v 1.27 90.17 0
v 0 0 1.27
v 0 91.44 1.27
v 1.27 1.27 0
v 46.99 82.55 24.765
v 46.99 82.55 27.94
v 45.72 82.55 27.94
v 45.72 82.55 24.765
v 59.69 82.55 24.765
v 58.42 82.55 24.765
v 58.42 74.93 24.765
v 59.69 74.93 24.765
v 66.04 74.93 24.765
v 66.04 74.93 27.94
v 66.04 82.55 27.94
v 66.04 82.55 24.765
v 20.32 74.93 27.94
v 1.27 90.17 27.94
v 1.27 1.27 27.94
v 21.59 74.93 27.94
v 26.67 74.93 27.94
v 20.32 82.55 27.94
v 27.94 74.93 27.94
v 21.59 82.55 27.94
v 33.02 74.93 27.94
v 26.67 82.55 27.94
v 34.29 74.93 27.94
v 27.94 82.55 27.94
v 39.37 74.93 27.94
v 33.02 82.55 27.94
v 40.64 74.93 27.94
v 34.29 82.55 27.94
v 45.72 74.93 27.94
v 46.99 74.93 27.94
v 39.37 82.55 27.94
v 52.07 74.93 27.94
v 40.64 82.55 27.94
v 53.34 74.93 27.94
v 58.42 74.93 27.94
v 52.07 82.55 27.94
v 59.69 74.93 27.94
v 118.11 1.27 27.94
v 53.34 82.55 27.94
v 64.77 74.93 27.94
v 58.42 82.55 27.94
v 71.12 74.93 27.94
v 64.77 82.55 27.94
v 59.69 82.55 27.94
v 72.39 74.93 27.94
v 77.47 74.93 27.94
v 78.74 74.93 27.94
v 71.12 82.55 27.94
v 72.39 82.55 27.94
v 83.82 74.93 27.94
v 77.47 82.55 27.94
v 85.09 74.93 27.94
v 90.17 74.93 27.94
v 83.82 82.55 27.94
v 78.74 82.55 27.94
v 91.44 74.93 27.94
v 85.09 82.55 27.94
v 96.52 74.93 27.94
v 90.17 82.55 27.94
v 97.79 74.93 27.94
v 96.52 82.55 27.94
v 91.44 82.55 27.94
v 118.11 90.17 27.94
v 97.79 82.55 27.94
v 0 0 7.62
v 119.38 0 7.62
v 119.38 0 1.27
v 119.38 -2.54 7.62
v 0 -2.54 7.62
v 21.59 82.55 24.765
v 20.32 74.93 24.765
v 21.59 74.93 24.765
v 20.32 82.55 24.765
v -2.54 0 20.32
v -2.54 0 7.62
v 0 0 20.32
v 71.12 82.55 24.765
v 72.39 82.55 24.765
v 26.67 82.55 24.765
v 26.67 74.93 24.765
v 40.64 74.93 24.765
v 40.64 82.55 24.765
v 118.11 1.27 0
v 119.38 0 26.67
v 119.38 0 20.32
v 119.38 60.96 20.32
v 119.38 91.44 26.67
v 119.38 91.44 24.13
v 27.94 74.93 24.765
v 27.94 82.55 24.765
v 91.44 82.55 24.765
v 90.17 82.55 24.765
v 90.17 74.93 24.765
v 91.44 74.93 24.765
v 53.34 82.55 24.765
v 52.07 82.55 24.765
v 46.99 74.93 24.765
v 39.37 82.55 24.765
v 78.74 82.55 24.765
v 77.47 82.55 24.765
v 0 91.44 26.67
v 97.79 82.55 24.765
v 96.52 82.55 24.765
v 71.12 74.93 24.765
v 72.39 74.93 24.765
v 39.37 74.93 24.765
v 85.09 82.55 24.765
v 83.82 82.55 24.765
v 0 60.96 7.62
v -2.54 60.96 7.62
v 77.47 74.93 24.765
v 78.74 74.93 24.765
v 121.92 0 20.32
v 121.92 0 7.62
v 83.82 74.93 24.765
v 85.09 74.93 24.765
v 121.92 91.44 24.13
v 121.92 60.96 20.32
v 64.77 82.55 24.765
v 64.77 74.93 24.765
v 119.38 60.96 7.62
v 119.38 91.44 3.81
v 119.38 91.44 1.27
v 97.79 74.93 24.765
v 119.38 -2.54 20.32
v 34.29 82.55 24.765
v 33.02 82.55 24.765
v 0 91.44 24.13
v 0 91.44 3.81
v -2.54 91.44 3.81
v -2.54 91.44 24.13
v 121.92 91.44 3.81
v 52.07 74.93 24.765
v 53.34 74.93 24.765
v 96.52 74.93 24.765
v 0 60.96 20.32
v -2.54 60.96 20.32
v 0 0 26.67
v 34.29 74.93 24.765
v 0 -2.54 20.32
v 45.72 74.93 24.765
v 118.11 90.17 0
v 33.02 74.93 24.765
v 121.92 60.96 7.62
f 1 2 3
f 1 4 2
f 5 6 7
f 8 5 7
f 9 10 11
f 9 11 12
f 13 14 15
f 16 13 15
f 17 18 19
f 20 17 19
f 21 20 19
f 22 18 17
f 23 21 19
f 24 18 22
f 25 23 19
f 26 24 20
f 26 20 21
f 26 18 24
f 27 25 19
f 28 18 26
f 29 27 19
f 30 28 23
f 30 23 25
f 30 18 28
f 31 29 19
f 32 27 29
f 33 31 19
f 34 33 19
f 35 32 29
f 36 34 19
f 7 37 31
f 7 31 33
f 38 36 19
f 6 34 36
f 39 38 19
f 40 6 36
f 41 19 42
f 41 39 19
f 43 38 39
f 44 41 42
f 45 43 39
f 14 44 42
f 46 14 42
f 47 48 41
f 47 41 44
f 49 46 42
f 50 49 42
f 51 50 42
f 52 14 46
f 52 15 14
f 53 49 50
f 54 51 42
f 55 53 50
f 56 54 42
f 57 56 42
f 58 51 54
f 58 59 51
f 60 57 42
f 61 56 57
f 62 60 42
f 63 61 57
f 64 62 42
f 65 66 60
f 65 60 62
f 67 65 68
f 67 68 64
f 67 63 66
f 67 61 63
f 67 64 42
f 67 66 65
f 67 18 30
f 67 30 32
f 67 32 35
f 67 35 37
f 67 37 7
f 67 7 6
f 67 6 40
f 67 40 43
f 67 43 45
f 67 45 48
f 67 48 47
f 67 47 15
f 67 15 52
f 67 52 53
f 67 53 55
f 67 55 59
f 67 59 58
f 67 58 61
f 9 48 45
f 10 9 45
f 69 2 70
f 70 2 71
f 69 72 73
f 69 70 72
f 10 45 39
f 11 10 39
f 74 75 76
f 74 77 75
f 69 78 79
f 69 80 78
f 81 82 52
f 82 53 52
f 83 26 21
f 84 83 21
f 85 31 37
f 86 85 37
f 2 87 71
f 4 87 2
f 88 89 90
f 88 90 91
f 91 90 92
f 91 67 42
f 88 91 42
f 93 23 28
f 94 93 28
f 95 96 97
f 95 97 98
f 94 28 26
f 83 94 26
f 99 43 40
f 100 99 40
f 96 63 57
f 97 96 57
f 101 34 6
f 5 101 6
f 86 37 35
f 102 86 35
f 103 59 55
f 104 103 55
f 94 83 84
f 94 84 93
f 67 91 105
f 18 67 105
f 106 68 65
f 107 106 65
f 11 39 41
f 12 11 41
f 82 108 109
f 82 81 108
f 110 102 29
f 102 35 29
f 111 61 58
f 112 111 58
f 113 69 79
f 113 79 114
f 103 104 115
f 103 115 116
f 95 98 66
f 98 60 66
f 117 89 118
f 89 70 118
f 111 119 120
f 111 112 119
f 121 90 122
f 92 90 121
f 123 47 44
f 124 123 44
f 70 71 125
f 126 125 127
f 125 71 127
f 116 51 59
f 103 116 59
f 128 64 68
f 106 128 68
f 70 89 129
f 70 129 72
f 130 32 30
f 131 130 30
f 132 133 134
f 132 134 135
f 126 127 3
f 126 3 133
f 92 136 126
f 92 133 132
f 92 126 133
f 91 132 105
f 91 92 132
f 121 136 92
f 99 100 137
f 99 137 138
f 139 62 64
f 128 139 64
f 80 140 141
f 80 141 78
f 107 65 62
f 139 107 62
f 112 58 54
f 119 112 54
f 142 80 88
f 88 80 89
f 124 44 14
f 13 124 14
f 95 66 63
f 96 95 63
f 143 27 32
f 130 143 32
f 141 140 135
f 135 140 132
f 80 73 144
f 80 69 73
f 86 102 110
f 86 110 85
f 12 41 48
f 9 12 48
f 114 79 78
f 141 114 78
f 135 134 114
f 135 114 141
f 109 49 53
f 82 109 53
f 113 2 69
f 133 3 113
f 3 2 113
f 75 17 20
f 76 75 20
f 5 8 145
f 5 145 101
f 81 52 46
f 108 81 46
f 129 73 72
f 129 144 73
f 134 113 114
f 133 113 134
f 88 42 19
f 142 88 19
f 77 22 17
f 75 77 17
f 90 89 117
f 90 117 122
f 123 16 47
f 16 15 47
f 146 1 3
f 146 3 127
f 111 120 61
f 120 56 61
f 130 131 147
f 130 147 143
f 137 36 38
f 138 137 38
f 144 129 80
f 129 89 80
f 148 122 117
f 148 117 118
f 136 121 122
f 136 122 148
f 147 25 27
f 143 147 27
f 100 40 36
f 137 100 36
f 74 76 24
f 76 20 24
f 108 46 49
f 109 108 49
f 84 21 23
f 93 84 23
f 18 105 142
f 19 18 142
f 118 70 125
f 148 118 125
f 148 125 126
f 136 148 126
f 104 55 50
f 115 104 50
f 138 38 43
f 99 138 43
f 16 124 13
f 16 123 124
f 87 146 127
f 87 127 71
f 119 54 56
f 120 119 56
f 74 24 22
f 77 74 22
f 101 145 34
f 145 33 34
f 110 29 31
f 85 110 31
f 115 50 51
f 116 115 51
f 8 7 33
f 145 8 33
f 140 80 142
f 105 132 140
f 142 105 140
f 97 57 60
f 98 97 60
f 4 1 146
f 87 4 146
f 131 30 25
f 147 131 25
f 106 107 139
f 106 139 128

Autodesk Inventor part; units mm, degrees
ref_plane "YZ Plane" through (0, 0, 0) normal (1, 0, 0) x (0, 1, 0)
ref_plane "XZ Plane" through (0, 0, 0) normal (0, 1, 0) x (-1, 0, 0)
ref_plane "XY Plane" through (0, 0, 0) normal (0, 0, 1) x (1, 0, 0)
sketch "Sketch1" plane through (0, 0, 0) normal (0, 0, 1) x (1, 0, 0)
  line L0 (0, 0) -> (119.38, 0)
  line L1 (119.38, 0) -> (119.38, 91.44)
  line L2 (119.38, 91.44) -> (0, 91.44)
  line L3 (0, 91.44) -> (0, 0)
  dimension "d0" = 119.38
  dimension "d1" = 91.44
extrude "Extrusion1" add sketch "Sketch1" along normal blind 27.94
chamfer "Chamfer1" distance 1.27 angle 45 1 edges at (59.69, 0, 0)
chamfer "Chamfer2" distance 1.27 angle 45 1 edges at (0, 46.355, 0)
chamfer "Chamfer3" distance 1.27 angle 45 1 edges at (60.325, 91.44, 0)
chamfer "Chamfer4" distance 1.27 angle 45 1 edges at (119.38, 45.72, 0)
chamfer "Chamfer5" distance 1.27 angle 45 1 edges at (0, 45.72, 27.94)
chamfer "Chamfer6" distance 1.27 angle 45 1 edges at (60.325, 0, 27.94)
chamfer "Chamfer7" distance 1.27 angle 45 2 edges at (60.325, 91.44, 27.94) (119.38, 46.355, 27.94)
sketch "Sketch2" plane through (119.38, 0, 1.27) normal (1, 0, 0) x (0, 0, -1)
  line L0 (-25.4, 0) -> (-25.4, 91.44) projected
  line L1 (0, 0) -> (-25.4, 0) projected
  line L2 (-19.05, 0) -> (-19.05, 60.96)
  line L3 (-6.35, 0) -> (-6.35, 60.96)
  line L4 (-19.05, 0) -> (-6.35, 0)
  line L5 (-19.05, 60.96) -> (-22.86, 91.44)
  line L6 (0, 91.44) -> (-25.4, 91.44) projected
  line L7 (-6.35, 60.96) -> (-2.54, 91.44)
  line L8 (-22.86, 91.44) -> (-2.54, 91.44)
  dimension "d25" = 60.96
  dimension "d26" = 60.96
  dimension "d27" = 12.7
  dimension "d28" = 6.35
  dimension "d29" = 20.32
  dimension "d30" = 2.54
extrude "Extrusion2" add sketch "Sketch2" along normal blind 2.54 contours L2 L5 L6 L7 L3 L1
sketch "Sketch3" plane through (0, 0, 1.27) normal (0, -1, 0) x (1, 0, 0)
  line L0 (0, 0) -> (0, 25.4) projected
  line L1 (119.38, 19.05) -> (0, 19.05)
  line L2 (119.38, 6.35) -> (0, 6.35)
  line L3 (0, 19.05) -> (0, 6.35)
  line L4 (119.38, 19.05) -> (119.38, 6.35)
extrude "Extrusion3" add sketch "Sketch3" along normal blind 2.54
sketch "Sketch4" plane through (0, 0, 1.27) normal (-1, 0, 0) x (0, 0, 1)
  line L0 (25.4, 91.44) -> (25.4, 0) projected
  line L1 (0, 91.44) -> (25.4, 91.44) projected
  line L2 (0, 0) -> (0, 91.44) projected
  line L3 (0, 0) -> (6.35, 0) projected
  line L4 (6.35, 0) -> (6.35, -2.54) projected
  line L5 (19.05, -2.54) -> (6.35, -2.54) projected
  line L6 (19.05, 0) -> (19.05, -2.54) projected
  line L7 (19.05, 0) -> (25.4, 0) projected
sketch "Sketch5" plane through (121.92, 0, 1.27) normal (1, 0, 0) x (0, 0, -1)
  line L0 (-2.54, 91.44) -> (-22.86, 91.44) projected
  line L1 (-22.86, 91.44) -> (-19.05, 60.96) projected
  line L2 (-19.05, 60.96) -> (-19.05, 0) projected
  line L3 (-19.05, 0) -> (-6.35, 0) projected
  line L4 (-6.35, 0) -> (-6.35, 60.96) projected
  line L5 (-6.35, 60.96) -> (-2.54, 91.44) projected
sketch "Sketch6" plane through (0, 0, 1.27) normal (-1, 0, 0) x (0, 0, 1)
  line L0 (25.4, 91.44) -> (25.4, 0) projected
  line L1 (0, 91.44) -> (25.4, 91.44) projected
  line L2 (19.05, -2.54) -> (6.35, -2.54) projected
  line L3 (6.35, 0) -> (6.35, 60.96)
  line L4 (6.35, 0) -> (6.35, 60.96) projected
  line L5 (19.05, 60.96) -> (19.05, 0)
  line L6 (19.05, 0) -> (6.35, 0)
  line L7 (6.35, 60.96) -> (2.54, 91.44)
  line L8 (2.54, 91.44) -> (6.35, 60.96) projected
  line L9 (19.05, 60.96) -> (22.86, 91.44)
  line L10 (2.54, 91.44) -> (22.86, 91.44)
  dimension "d35" = 60.96
  dimension "d36" = 2.54
  dimension "d37" = 6.35
extrude "Extrusion4" add sketch "Sketch6" along normal blind 2.54
sketch "Sketch7" plane through (0, 0, 27.94) normal (0, 0, 1) x (1, 0, 0)
  line L0 (1.27, 90.17) -> (118.11, 90.17) projected
  line L1 (20.32, 82.55) -> (20.32, 74.93)
  line L2 (20.32, 74.93) -> (21.59, 74.93)
  line L3 (21.59, 74.93) -> (21.59, 82.55)
  line L4 (21.59, 82.55) -> (20.32, 82.55)
  line L5 (0, 91.44) -> (0, 0) projected
  line L6 (26.67, 82.55) -> (26.67, 74.93)
  line L7 (26.67, 74.93) -> (27.94, 74.93)
  line L8 (27.94, 74.93) -> (27.94, 82.55)
  line L9 (27.94, 82.55) -> (26.67, 82.55)
  line L10 (33.02, 82.55) -> (33.02, 74.93)
  line L11 (33.02, 74.93) -> (34.29, 74.93)
  line L12 (34.29, 74.93) -> (34.29, 82.55)
  line L13 (34.29, 82.55) -> (33.02, 82.55)
  line L14 (39.37, 82.55) -> (39.37, 74.93)
  line L15 (39.37, 74.93) -> (40.64, 74.93)
  line L16 (40.64, 74.93) -> (40.64, 82.55)
  line L17 (40.64, 82.55) -> (39.37, 82.55)
  line L18 (45.72, 82.55) -> (45.72, 74.93)
  line L19 (45.72, 74.93) -> (46.99, 74.93)
  line L20 (46.99, 74.93) -> (46.99, 82.55)
  line L21 (46.99, 82.55) -> (45.72, 82.55)
  line L22 (52.07, 82.55) -> (52.07, 74.93)
  line L23 (52.07, 74.93) -> (53.34, 74.93)
  line L24 (53.34, 74.93) -> (53.34, 82.55)
  line L25 (53.34, 82.55) -> (52.07, 82.55)
  line L26 (58.42, 82.55) -> (58.42, 74.93)
  line L27 (58.42, 74.93) -> (59.69, 74.93)
  line L28 (59.69, 74.93) -> (59.69, 82.55)
  line L29 (59.69, 82.55) -> (58.42, 82.55)
  line L30 (64.77, 82.55) -> (64.77, 74.93)
  line L31 (64.77, 74.93) -> (66.04, 74.93)
  line L32 (66.04, 74.93) -> (66.04, 82.55)
  line L33 (66.04, 82.55) -> (64.77, 82.55)
  line L34 (71.12, 82.55) -> (71.12, 74.93)
  line L35 (71.12, 74.93) -> (72.39, 74.93)
  line L36 (72.39, 74.93) -> (72.39, 82.55)
  line L37 (72.39, 82.55) -> (71.12, 82.55)
  line L38 (77.47, 82.55) -> (77.47, 74.93)
  line L39 (77.47, 74.93) -> (78.74, 74.93)
  line L40 (78.74, 74.93) -> (78.74, 82.55)
  line L41 (78.74, 82.55) -> (77.47, 82.55)
  line L42 (83.82, 82.55) -> (83.82, 74.93)
  line L43 (83.82, 74.93) -> (85.09, 74.93)
  line L44 (85.09, 74.93) -> (85.09, 82.55)
  line L45 (85.09, 82.55) -> (83.82, 82.55)
  line L46 (90.17, 82.55) -> (90.17, 74.93)
  line L47 (90.17, 74.93) -> (91.44, 74.93)
  line L48 (91.44, 74.93) -> (91.44, 82.55)
  line L49 (91.44, 82.55) -> (90.17, 82.55)
  line L50 (96.52, 82.55) -> (96.52, 74.93)
  line L51 (96.52, 74.93) -> (97.79, 74.93)
  line L52 (97.79, 74.93) -> (97.79, 82.55)
  line L53 (97.79, 82.55) -> (96.52, 82.55)
  dimension "d40" = 7.62
  dimension "d41" = 1.27
  dimension "d42" = 7.62
  dimension "d44" = 20.32
  dimension "d47" = 6.35
extrude "Extrusion5" cut sketch "Sketch7" against normal blind 3.175
properties part number "Wireless Router"
